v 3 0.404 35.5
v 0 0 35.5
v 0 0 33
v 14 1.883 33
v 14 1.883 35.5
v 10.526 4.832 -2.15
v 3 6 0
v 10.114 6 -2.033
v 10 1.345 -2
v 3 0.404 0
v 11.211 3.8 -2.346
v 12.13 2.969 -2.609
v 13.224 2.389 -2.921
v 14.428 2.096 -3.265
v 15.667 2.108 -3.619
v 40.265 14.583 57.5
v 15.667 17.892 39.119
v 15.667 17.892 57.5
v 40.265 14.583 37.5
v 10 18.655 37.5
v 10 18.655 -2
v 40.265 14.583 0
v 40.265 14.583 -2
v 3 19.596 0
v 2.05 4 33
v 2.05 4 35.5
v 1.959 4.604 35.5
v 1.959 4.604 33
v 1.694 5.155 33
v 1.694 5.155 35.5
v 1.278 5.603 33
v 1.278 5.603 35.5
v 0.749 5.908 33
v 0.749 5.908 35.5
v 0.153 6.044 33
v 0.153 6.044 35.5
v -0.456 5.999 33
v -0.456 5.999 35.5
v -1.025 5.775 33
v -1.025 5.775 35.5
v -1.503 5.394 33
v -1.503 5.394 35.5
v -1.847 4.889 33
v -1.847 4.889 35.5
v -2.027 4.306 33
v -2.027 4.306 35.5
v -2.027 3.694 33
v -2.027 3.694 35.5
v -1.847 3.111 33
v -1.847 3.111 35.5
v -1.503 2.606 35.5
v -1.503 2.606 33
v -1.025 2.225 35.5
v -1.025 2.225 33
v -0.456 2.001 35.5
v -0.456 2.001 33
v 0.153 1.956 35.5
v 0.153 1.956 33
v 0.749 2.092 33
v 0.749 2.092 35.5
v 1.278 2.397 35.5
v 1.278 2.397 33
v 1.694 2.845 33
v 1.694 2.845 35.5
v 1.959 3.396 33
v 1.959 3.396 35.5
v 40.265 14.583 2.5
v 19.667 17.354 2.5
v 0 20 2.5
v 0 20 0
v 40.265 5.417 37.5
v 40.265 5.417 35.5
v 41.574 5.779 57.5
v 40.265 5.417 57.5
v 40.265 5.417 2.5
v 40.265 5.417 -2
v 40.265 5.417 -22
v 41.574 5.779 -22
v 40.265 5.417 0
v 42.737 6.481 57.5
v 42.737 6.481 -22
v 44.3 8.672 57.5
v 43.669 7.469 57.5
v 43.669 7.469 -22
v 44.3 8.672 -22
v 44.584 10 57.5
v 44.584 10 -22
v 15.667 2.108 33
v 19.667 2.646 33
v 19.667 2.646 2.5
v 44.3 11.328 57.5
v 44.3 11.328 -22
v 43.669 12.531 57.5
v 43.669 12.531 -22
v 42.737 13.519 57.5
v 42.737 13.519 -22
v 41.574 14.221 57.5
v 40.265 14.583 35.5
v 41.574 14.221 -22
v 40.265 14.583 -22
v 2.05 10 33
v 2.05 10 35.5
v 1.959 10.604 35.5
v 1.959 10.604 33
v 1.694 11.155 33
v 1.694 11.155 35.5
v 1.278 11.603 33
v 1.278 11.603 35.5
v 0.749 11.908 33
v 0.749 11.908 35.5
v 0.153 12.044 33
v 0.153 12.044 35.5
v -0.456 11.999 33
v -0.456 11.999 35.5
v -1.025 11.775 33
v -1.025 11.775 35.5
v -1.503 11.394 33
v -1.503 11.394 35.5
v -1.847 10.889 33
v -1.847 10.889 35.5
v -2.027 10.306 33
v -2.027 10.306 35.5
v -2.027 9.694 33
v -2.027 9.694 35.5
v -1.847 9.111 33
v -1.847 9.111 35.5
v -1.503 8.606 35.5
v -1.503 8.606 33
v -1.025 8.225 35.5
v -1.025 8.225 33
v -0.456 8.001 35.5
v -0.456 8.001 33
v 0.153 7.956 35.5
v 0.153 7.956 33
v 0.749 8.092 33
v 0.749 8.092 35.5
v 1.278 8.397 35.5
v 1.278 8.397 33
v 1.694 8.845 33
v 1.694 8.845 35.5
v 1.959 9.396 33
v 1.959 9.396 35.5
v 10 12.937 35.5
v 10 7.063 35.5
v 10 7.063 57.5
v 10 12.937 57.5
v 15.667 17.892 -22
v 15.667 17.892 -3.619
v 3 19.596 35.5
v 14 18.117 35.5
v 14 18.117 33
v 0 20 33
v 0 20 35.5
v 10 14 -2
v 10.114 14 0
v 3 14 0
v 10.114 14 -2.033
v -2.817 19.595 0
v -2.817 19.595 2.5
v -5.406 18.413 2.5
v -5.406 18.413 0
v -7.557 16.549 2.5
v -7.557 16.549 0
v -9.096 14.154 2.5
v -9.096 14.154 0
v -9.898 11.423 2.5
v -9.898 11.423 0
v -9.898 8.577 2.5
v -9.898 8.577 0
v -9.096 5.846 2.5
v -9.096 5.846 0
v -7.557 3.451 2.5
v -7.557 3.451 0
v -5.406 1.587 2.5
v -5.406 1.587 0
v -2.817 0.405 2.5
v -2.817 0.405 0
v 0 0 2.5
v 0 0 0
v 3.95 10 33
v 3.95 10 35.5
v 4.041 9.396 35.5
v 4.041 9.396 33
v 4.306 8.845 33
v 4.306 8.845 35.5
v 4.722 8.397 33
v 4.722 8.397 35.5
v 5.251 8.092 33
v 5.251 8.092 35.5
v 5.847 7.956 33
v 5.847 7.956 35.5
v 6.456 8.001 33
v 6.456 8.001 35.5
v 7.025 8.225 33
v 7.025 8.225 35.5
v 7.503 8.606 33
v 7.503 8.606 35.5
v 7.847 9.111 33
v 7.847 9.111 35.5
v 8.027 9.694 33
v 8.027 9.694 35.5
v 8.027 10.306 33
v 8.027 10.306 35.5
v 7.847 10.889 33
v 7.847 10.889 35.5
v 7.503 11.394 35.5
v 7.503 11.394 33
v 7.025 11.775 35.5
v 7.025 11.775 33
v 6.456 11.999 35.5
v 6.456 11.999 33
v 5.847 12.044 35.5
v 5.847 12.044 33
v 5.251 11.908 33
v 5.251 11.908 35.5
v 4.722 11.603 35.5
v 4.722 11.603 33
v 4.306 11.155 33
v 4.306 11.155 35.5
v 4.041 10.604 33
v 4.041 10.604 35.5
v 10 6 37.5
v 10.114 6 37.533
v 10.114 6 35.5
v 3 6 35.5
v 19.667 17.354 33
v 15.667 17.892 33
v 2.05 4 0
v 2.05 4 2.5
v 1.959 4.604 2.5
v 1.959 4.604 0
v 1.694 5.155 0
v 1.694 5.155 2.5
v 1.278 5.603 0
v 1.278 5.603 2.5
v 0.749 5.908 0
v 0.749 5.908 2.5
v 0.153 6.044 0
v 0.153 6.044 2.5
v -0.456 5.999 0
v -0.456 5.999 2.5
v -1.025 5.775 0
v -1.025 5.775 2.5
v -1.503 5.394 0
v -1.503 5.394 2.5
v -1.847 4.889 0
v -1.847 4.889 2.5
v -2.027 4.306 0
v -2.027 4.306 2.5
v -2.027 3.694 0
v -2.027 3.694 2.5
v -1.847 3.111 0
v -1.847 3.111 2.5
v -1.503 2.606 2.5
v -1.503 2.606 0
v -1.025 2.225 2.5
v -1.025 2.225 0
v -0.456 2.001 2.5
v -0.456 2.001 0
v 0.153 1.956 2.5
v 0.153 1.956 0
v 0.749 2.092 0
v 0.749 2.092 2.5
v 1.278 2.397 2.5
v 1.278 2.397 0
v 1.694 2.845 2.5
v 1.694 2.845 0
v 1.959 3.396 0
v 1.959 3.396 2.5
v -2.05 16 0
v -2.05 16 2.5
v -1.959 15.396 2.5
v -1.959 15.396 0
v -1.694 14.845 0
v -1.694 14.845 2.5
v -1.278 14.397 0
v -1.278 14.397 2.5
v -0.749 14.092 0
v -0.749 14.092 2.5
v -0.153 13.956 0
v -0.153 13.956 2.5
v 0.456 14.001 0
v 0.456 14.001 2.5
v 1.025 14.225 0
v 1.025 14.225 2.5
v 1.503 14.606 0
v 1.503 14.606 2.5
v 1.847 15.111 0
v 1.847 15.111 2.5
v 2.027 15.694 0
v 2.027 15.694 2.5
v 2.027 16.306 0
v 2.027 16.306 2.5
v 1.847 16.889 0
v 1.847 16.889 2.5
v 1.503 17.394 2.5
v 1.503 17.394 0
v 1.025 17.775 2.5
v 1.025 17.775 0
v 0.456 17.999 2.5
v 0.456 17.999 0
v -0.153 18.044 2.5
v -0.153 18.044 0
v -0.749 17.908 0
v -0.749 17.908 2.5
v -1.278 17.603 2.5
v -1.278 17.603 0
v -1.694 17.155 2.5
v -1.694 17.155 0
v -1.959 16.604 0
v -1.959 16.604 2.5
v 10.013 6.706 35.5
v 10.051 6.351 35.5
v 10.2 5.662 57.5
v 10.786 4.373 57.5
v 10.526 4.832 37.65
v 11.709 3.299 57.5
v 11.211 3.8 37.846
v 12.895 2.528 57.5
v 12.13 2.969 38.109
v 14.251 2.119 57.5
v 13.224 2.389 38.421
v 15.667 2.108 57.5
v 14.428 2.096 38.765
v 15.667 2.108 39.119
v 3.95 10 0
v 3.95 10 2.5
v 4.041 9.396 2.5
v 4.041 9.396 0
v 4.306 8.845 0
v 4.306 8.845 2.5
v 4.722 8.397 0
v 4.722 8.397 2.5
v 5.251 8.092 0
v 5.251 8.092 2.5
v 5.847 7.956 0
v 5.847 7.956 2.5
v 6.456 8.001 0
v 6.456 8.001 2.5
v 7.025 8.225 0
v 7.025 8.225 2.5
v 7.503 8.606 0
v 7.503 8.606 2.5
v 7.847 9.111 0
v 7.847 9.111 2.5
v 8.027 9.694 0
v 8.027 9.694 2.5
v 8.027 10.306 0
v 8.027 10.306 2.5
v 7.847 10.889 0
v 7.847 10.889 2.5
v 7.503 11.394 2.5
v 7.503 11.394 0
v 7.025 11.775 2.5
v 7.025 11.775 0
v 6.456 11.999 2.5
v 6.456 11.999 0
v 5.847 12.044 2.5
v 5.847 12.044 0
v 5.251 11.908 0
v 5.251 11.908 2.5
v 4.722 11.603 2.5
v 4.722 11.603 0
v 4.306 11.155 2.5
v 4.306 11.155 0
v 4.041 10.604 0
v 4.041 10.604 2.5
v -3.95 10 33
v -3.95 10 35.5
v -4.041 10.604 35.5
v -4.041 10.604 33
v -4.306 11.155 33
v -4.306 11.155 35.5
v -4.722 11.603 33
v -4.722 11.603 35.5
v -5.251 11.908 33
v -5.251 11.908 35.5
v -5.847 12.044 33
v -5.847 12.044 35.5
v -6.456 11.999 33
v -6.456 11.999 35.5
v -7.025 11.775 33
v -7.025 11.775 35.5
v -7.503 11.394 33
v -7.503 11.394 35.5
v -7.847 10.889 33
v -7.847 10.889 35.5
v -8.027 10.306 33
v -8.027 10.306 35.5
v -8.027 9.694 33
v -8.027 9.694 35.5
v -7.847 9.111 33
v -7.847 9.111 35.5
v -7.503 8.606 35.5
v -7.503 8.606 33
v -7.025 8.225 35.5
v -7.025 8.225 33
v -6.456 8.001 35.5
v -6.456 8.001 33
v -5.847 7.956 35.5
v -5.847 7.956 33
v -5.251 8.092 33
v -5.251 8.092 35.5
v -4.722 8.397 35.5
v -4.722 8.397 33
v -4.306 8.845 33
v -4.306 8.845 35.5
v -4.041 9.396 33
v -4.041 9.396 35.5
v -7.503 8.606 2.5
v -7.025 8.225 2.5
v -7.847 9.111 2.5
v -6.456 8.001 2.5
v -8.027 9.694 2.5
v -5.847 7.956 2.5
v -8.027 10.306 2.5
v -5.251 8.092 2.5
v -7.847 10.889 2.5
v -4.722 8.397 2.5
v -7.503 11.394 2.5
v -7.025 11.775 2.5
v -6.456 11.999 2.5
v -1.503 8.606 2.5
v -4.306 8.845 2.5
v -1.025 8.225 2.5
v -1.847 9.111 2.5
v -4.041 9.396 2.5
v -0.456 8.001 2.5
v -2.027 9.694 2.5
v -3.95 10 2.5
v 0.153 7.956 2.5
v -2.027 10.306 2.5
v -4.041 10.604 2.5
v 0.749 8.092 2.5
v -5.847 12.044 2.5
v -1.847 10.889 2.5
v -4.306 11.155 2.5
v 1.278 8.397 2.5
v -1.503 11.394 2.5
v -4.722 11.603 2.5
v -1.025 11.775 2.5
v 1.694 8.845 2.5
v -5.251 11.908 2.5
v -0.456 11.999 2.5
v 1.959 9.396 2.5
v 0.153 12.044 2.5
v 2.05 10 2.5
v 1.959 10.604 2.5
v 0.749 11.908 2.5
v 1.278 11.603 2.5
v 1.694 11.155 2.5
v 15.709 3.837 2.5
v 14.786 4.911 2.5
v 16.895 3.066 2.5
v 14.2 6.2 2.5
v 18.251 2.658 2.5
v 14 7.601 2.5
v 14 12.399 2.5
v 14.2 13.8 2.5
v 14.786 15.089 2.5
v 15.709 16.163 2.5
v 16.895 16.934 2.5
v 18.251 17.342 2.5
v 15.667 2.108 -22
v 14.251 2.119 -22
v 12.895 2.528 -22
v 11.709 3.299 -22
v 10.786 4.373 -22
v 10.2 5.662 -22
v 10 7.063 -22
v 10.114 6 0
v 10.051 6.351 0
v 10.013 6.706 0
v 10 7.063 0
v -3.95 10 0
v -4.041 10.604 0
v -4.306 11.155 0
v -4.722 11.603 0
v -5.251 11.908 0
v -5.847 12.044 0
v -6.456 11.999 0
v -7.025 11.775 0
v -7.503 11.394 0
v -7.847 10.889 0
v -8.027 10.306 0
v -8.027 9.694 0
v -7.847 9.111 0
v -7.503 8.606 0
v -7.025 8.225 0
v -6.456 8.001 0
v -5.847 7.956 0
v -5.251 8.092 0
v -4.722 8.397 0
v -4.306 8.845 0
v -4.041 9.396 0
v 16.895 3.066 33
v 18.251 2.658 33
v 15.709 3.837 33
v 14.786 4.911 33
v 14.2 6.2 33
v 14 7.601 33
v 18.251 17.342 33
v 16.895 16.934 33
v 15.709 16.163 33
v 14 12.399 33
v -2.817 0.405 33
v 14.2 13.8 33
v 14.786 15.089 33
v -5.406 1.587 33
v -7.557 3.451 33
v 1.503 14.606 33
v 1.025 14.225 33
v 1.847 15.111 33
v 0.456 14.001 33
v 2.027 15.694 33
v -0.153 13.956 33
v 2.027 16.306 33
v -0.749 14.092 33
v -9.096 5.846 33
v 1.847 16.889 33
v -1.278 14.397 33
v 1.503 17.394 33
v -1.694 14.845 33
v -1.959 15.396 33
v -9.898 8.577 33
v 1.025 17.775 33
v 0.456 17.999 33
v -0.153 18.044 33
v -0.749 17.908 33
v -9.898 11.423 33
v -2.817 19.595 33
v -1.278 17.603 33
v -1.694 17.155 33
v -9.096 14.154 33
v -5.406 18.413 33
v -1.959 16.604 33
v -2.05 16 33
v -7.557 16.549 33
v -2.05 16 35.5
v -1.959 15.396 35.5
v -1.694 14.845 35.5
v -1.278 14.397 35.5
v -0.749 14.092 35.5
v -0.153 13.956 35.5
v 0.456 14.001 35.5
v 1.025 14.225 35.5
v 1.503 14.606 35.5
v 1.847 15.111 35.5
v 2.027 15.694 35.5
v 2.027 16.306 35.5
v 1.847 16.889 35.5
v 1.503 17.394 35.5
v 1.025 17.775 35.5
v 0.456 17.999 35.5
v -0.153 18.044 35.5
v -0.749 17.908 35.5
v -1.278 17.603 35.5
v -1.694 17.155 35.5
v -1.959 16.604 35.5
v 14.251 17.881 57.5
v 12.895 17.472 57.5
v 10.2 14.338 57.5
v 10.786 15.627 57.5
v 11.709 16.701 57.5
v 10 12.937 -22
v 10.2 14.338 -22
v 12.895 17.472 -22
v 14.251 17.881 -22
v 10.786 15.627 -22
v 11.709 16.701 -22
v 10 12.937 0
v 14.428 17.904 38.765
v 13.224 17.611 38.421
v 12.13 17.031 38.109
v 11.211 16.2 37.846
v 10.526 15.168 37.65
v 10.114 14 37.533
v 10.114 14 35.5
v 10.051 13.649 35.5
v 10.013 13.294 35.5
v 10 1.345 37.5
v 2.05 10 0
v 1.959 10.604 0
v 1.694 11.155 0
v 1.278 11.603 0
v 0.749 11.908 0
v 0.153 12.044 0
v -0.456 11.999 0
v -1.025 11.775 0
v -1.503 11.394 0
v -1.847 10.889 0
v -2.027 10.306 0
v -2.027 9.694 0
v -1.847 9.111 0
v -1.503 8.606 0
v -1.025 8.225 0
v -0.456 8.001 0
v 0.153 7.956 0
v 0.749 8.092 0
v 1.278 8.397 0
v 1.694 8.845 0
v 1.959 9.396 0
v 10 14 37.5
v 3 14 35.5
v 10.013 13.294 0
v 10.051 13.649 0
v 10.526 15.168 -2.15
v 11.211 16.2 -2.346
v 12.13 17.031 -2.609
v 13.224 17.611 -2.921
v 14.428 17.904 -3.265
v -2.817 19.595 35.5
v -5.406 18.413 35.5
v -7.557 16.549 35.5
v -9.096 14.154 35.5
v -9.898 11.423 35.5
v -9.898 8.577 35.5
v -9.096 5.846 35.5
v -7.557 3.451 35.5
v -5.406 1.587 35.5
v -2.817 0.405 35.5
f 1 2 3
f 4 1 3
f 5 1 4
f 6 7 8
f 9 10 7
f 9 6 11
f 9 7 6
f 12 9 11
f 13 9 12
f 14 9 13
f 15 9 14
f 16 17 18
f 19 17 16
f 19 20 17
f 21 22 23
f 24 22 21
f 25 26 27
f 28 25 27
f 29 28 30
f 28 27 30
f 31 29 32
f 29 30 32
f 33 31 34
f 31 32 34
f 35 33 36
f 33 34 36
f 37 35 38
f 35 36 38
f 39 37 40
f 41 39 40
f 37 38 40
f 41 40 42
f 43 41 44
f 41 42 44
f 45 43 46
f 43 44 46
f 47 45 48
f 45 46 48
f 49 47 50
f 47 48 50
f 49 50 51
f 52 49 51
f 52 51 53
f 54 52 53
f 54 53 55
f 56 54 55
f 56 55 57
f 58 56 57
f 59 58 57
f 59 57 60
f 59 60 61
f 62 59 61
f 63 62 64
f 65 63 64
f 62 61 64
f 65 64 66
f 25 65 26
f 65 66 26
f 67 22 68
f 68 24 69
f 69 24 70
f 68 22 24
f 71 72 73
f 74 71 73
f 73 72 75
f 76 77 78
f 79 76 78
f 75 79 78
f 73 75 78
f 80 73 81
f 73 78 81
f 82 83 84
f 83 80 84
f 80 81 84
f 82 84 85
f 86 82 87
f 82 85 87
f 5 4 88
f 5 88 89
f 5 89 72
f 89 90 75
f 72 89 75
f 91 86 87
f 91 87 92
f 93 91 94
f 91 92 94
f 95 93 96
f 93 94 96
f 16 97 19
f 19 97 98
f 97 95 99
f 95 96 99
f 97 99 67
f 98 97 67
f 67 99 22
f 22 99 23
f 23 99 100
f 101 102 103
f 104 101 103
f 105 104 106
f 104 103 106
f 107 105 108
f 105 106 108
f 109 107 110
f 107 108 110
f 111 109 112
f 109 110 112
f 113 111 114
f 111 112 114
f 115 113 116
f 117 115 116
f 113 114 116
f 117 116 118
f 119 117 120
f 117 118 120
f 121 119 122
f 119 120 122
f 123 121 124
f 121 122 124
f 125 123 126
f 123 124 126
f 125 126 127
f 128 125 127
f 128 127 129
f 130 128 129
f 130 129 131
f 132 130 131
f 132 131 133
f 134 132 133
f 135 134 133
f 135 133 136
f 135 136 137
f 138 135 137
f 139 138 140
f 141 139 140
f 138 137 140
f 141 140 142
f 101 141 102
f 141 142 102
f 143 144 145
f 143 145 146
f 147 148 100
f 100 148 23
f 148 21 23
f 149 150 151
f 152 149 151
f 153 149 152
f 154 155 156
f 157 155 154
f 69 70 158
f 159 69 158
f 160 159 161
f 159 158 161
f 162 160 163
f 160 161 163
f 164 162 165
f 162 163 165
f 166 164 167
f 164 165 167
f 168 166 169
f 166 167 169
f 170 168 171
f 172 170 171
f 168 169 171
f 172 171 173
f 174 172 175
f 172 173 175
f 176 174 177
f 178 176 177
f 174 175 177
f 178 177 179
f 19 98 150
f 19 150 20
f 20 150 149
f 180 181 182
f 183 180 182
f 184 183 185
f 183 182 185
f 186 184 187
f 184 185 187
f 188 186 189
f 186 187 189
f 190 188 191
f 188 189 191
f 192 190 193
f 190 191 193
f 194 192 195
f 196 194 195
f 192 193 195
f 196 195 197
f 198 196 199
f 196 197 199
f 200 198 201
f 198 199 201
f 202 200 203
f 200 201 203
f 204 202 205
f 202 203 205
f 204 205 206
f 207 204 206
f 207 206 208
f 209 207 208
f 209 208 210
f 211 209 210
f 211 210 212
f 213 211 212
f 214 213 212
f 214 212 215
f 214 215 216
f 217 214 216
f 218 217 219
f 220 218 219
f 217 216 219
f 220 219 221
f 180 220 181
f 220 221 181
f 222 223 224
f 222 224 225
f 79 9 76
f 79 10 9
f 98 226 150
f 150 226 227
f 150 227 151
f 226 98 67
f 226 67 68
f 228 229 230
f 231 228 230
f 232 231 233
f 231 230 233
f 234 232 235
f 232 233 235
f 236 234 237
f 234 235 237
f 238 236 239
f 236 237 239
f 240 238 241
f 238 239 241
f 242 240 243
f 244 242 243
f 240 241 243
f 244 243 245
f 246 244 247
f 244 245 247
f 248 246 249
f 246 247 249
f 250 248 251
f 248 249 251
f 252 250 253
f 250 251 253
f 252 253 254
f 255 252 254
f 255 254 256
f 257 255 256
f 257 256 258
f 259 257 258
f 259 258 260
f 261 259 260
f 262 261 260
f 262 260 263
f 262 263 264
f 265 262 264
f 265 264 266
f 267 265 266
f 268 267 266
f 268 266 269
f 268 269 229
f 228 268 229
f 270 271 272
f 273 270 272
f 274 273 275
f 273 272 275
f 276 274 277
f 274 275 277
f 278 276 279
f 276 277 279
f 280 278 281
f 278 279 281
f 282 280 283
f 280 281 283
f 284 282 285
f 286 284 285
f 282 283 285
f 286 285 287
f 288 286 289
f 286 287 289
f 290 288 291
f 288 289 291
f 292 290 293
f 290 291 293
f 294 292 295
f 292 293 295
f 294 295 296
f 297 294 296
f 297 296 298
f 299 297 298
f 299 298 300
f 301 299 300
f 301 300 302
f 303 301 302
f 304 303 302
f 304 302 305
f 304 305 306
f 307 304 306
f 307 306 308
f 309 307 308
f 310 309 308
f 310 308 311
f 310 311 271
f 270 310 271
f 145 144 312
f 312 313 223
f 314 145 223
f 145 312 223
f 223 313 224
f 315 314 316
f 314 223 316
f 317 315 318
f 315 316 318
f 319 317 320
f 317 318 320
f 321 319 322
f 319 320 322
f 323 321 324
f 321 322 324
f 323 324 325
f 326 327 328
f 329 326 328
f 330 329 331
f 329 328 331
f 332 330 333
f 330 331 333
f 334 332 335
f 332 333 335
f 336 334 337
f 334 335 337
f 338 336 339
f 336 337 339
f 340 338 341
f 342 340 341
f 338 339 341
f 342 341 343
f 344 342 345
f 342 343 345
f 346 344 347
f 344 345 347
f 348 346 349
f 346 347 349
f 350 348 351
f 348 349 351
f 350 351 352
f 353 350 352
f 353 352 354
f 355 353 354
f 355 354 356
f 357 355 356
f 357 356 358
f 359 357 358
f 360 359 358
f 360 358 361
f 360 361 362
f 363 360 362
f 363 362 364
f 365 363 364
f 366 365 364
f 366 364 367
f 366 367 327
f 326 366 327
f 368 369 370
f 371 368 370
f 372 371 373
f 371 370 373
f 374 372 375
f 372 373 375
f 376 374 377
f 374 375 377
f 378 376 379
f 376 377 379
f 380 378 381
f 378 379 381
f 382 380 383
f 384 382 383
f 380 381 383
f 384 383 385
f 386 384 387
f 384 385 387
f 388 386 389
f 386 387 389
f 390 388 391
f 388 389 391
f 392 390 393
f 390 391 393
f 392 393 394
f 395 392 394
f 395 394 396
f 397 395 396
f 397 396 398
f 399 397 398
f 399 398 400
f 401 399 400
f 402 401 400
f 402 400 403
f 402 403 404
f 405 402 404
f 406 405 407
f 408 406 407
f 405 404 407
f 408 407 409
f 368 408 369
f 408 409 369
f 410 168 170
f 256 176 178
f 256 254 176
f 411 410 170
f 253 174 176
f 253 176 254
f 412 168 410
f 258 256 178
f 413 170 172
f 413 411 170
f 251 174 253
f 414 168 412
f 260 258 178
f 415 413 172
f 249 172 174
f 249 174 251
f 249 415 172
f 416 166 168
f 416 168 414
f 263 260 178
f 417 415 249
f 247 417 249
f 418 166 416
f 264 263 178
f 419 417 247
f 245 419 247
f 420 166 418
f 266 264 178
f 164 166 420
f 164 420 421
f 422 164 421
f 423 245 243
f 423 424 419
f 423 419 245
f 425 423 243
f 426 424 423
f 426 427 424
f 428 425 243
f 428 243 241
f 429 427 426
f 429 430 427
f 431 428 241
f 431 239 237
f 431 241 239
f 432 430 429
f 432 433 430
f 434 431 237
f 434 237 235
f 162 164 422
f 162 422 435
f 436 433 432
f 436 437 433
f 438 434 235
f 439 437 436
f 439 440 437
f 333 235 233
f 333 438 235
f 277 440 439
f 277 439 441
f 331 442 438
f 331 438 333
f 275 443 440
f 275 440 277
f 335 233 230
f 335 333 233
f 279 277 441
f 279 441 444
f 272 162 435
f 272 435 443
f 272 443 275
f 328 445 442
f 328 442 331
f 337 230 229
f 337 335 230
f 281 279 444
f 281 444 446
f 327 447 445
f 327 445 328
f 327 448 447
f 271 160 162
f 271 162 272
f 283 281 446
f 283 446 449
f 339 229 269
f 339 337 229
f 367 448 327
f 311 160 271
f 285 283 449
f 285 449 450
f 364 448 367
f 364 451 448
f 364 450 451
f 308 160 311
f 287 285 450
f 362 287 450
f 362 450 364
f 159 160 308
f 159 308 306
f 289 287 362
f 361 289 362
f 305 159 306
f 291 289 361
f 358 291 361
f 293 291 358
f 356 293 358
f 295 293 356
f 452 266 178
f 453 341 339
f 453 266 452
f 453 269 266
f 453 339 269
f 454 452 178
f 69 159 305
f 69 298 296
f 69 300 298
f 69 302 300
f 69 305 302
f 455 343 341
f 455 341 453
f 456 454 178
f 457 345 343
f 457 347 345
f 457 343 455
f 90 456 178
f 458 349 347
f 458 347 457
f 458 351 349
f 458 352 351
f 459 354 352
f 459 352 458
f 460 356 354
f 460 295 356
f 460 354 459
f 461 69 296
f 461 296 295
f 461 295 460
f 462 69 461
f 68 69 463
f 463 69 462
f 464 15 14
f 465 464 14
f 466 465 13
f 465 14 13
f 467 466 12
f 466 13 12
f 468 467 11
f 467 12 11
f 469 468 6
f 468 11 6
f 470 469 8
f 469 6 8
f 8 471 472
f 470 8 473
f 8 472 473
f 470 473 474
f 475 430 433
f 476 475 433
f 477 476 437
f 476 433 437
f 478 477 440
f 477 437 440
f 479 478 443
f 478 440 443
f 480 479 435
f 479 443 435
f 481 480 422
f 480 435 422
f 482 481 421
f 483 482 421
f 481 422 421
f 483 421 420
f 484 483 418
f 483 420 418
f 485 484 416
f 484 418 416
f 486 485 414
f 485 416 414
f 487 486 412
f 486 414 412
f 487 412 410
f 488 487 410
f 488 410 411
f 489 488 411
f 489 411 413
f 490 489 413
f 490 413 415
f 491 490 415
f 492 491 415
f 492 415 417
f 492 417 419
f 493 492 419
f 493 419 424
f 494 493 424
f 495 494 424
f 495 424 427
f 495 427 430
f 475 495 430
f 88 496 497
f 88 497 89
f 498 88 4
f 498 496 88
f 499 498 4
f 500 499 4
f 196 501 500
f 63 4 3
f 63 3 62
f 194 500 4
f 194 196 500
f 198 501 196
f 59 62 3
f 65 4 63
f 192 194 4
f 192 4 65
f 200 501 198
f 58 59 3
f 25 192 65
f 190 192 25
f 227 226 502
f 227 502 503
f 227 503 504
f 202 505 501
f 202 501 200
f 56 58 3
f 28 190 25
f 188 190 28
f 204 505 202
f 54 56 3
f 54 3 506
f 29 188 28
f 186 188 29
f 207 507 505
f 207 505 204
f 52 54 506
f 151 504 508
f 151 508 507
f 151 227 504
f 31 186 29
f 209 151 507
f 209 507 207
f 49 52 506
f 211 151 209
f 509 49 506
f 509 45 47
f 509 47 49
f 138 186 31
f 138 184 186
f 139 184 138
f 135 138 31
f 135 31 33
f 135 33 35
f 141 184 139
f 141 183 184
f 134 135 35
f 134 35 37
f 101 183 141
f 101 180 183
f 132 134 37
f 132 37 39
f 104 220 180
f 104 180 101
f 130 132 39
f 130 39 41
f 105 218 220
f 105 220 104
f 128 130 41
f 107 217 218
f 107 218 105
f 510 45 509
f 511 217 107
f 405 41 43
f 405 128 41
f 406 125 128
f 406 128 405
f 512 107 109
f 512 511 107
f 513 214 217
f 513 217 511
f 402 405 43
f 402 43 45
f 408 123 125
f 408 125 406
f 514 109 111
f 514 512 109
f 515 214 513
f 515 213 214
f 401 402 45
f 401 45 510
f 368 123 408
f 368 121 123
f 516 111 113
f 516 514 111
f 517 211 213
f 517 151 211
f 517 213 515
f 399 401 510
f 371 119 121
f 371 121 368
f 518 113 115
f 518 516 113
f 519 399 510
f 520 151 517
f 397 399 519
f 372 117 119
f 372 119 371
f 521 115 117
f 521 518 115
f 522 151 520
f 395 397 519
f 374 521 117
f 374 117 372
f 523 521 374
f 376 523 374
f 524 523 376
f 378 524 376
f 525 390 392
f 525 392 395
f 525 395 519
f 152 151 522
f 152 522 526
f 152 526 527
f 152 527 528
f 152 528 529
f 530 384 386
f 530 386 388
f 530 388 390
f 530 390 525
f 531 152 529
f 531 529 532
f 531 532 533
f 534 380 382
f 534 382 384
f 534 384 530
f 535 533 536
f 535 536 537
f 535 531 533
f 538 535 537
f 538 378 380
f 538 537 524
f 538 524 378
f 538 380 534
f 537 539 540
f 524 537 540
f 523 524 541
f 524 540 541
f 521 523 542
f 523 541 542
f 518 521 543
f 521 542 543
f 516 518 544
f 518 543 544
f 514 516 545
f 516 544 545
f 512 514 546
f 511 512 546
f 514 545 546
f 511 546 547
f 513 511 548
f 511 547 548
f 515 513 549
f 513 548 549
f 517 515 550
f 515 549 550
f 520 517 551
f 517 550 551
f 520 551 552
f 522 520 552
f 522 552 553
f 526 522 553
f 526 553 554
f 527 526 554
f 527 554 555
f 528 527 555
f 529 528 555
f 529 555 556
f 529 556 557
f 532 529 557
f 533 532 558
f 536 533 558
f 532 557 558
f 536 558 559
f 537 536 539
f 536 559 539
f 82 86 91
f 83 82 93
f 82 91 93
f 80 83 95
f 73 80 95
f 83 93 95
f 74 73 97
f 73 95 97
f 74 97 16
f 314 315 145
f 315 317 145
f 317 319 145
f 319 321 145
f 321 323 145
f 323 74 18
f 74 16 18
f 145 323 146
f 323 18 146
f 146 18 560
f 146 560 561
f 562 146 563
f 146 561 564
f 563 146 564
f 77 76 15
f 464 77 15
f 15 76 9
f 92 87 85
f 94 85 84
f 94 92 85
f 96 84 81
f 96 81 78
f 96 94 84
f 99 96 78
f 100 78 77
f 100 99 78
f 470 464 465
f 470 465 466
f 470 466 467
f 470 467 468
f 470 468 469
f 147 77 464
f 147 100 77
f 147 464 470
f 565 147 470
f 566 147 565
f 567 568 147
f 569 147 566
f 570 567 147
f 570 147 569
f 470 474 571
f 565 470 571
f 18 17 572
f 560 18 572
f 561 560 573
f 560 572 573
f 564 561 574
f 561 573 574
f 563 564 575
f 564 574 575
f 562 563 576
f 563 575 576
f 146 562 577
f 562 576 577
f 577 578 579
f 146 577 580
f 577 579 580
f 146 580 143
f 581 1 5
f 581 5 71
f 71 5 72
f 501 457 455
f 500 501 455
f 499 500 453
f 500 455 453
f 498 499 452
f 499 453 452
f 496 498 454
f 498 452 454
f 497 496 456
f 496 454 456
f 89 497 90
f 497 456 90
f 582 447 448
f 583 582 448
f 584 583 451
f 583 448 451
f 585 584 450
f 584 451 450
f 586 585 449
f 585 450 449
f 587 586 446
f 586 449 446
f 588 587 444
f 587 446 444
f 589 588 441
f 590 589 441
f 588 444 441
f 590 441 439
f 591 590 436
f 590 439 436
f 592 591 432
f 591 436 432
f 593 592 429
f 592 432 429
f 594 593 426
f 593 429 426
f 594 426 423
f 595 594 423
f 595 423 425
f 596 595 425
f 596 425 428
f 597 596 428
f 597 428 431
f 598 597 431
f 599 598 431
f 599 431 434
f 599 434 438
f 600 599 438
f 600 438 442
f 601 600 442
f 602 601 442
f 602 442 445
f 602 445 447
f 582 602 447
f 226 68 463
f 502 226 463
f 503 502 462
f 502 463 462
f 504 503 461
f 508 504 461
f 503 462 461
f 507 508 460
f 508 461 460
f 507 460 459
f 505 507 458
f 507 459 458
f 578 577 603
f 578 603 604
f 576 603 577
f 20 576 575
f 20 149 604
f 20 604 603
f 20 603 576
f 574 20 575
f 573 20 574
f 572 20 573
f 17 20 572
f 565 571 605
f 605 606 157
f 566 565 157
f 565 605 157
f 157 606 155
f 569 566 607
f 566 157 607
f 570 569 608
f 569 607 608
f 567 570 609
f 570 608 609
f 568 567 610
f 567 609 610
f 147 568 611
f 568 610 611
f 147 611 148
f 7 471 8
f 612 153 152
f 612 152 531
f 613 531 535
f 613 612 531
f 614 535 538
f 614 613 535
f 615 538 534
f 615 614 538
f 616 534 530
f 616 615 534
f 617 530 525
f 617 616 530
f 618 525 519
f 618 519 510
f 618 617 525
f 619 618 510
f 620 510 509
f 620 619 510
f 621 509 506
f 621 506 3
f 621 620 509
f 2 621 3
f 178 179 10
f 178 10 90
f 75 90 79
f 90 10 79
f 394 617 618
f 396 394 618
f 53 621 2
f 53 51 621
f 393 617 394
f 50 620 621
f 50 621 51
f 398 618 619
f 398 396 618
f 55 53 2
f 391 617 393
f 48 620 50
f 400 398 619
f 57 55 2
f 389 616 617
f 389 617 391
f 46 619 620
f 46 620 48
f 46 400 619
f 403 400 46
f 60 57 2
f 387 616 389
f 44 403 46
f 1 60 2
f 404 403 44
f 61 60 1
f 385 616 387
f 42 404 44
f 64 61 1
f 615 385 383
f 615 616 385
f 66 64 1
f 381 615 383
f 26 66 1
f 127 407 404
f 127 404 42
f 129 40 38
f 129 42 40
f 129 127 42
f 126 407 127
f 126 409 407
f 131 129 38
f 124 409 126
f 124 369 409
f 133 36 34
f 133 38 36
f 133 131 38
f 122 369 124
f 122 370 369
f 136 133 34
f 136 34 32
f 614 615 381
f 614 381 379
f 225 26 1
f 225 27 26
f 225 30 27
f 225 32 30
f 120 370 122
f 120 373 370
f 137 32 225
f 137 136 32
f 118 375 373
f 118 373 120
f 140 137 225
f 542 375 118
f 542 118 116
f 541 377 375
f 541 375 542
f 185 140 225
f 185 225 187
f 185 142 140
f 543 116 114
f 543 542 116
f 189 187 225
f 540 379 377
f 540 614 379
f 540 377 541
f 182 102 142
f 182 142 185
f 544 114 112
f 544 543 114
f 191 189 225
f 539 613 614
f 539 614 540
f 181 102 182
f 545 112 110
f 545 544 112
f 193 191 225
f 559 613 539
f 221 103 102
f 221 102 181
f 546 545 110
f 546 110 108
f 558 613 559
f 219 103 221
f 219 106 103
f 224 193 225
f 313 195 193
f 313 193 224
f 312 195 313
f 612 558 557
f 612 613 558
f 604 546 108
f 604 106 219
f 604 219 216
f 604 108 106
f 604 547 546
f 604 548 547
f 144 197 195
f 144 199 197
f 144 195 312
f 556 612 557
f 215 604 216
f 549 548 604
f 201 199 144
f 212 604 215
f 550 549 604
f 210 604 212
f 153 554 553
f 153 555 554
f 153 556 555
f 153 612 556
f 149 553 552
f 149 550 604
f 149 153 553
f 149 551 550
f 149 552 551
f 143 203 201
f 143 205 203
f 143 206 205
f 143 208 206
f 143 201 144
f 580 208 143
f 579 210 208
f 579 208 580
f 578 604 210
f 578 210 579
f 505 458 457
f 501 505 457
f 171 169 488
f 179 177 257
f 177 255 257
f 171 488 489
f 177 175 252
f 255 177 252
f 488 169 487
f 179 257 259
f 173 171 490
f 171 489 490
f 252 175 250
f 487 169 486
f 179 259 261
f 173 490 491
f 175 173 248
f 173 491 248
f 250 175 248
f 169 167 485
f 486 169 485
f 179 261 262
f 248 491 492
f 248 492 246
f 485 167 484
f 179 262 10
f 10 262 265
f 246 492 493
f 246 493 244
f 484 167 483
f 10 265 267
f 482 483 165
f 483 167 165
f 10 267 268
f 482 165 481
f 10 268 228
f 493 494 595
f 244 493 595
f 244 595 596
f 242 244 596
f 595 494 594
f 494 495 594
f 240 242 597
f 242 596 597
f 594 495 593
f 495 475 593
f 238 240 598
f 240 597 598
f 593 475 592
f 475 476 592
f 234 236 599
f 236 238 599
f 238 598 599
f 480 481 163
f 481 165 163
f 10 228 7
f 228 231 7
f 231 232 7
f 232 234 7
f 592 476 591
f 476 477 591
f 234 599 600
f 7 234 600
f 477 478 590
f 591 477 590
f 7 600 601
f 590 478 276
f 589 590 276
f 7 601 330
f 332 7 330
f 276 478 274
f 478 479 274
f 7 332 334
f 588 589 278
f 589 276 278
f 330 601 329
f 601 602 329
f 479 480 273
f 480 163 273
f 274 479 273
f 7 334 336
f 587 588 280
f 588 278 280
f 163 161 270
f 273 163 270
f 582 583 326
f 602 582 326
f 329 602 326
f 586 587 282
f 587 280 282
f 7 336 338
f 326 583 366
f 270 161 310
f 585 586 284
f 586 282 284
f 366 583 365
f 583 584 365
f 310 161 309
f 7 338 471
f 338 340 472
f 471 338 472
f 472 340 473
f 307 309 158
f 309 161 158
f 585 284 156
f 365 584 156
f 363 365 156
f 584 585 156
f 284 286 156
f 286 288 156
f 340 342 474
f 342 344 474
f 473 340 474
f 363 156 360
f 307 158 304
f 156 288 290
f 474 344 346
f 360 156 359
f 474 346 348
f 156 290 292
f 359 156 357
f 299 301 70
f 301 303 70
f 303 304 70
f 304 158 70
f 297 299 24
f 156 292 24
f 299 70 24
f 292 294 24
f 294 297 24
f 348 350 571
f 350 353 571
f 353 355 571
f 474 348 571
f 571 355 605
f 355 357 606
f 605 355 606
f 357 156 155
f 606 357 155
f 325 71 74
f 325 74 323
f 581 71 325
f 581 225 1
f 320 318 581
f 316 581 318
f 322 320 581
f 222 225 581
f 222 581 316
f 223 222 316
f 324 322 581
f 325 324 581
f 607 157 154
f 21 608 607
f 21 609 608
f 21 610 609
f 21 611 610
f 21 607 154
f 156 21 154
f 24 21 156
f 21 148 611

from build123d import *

# Parameters (mm, degrees)
BOSS_EXTRU_1_DEPTH           = 2.5
ESQUISSE2_R                  = 2.05
ENL_V_MAT_EXTRU_1_DEPTH      = 49.94129136
BOSS_EXTRU_2_DEPTH           = 33
ESQUISSE6_R                  = 2.05
BOSS_EXTRU_3_DEPTH           = 2.5
BOSS_EXTRU_4_DEPTH           = 2
BOSS_EXTRU_5_START           = -35.5
BOSS_EXTRU_5_DEPTH           = 2
ENL_V_MAT_EXTRU_5_DEPTH      = 62.605600395
ENL_V_MAT_EXTRU_5_DEPTH_BACK = 62.605600395
BOSS_EXTRU_6_DEPTH           = 20
BOSS_EXTRU_7_START           = -39.5
BOSS_EXTRU_7_DEPTH           = 20
CONG_1_R                     = 5


with BuildPart() as part:
    # Esquisse1 → Boss.-Extru.1 (new body)
    with BuildSketch(Plane.XY):
        with BuildLine():
            Line((0, 0), (44.598206242, 6))
            Line((44.598206242, 6), (44.598206242, 14))
            Line((44.598206242, 14), (0, 20))
            ThreePointArc((0, 20), (-10, 10), (0, 0))
        make_face()
    extrude(amount=BOSS_EXTRU_1_DEPTH)

    # Esquisse2 → Enlèv. mat.-Extru.1 (cut, through all)
    with BuildSketch(Plane.XY.offset(2.5)):
        with Locations((-6, 10)):
            Circle(ESQUISSE2_R)
        with Locations((0, 4)):
            Circle(ESQUISSE2_R)
        with Locations(Location((0, 16, 0), (0, 0, 180))):
            Circle(ESQUISSE2_R)
        with Locations(Location((6, 10, 0), (0, 0, 180))):
            Circle(ESQUISSE2_R)
        with Locations((0, 10)):
            Circle(ESQUISSE2_R)
    extrude(amount=-ENL_V_MAT_EXTRU_1_DEPTH, mode=Mode.SUBTRACT)

    # Esquisse5 → Boss.-Extru.2 (add)
    with BuildSketch(Plane.XY.offset(2.5)):
        Polygon((44.598206242, 14), (14, 18.116516177), (14, 1.883483823), (44.598206242, 6), align=None)
    extrude(amount=BOSS_EXTRU_2_DEPTH)

    # Esquisse6 → Boss.-Extru.3 (add)
    with BuildSketch(Plane.XY.offset(35.5)):
        with BuildLine():
            Line((44.598206242, 14), (0, 20))
            ThreePointArc((0, 20), (-10, 10), (0, 0))
            Line((0, 0), (44.598206242, 6))
            Line((44.598206242, 6), (44.598206242, 14))
        make_face()
        with Locations(Location((0, 16, 0), (0, 0, 180))):
            Circle(ESQUISSE6_R, mode=Mode.SUBTRACT)
        with Locations((-6, 10)):
            Circle(ESQUISSE6_R, mode=Mode.SUBTRACT)
        with Locations(Location((6, 10, 0), (0, 0, 180))):
            Circle(ESQUISSE6_R, mode=Mode.SUBTRACT)
        with Locations((0, 4)):
            Circle(ESQUISSE6_R, mode=Mode.SUBTRACT)
        with Locations((0, 10)):
            Circle(ESQUISSE6_R, mode=Mode.SUBTRACT)
    extrude(amount=-BOSS_EXTRU_3_DEPTH)

    # Esquisse9 → Boss.-Extru.4 (add)
    with BuildSketch(Plane.XY.offset(35.5)):
        Polygon((44.598206242, 14), (3, 19.596396324), (3, 14), (10, 14), (10, 6), (3, 6), (3, 0.403603676), (44.598206242, 6), align=None)
    extrude(amount=BOSS_EXTRU_4_DEPTH)

    # Esquisse9<2> → Boss.-Extru.5 (add)
    with BuildSketch(Plane.XY.offset(35.5).offset(BOSS_EXTRU_5_START)):
        Polygon((44.598206242, 14), (3, 19.596396324), (3, 14), (10, 14), (10, 6), (3, 6), (3, 0.403603676), (44.598206242, 6), align=None)
    extrude(amount=-BOSS_EXTRU_5_DEPTH)

    # Esquisse11 → Enlèv. mat.-Extru.5 (cut, two sides: drawn at the far end of the back side and taken through both)
    with BuildSketch(Plane(origin=(0, 0, 0), x_dir=(1, 0, 0), z_dir=(0, 1, 0)).offset(-ENL_V_MAT_EXTRU_5_DEPTH_BACK)):
        Polygon((3, -35.5), (10, -37.5), (3, -37.5), align=None)
        Polygon((3, 2), (3, 0), (10, 2), align=None)
    extrude(amount=ENL_V_MAT_EXTRU_5_DEPTH + ENL_V_MAT_EXTRU_5_DEPTH_BACK, mode=Mode.SUBTRACT)

    # Esquisse12 → Boss.-Extru.6 (add)
    with BuildSketch(Plane(origin=(0, 0, -2), x_dir=(-1, 0, 0), z_dir=(0, 0, -1))):
        Polygon((-44.598206242, 14), (-44.598206242, 6), (-10, 1.345345588), (-10, 18.654654412), align=None)
    extrude(amount=BOSS_EXTRU_6_DEPTH)

    # Esquisse12<2> → Boss.-Extru.7 (add)
    with BuildSketch(Plane(origin=(0, 0, -2), x_dir=(-1, 0, 0), z_dir=(0, 0, -1)).offset(BOSS_EXTRU_7_START)):
        Polygon((-44.598206242, 14), (-44.598206242, 6), (-10, 1.345345588), (-10, 18.654654412), align=None)
    extrude(amount=-BOSS_EXTRU_7_DEPTH)

    # Congé1
    # the kernel refuses this fillet: 5 mm, written as the material it takes off along each edge
    with BuildSketch(Plane(origin=(10, 18.654654412, 23.205703128), x_dir=(0.9910712498212338, -0.1333333333333327, 0), z_dir=(0, 0, 1))) as cong_1_piece_1_section:
        with BuildLine():
            CenterArc((CONG_1_R * 1.14354374979, -CONG_1_R), CONG_1_R, 90, 97.662255661)
            Line((CONG_1_R * 0.152472499972, -CONG_1_R * 1.13333333333), (0, 0))
            Line((0, 0), (CONG_1_R * 1.14354374979, 0))
        make_face()
    cong_1_piece_1 = extrude(amount=48.588593745, mode=Mode.PRIVATE)
    cong_1_piece_1 = split(cong_1_piece_1, bisect_by=Plane(origin=(14.41713272, 17.97630815, 33), z_dir=(0, 0, -1)), keep=Keep.TOP, mode=Mode.PRIVATE)
    add(cong_1_piece_1, mode=Mode.SUBTRACT)
    with BuildSketch(Plane(origin=(10, 18.654654412, 23.205703128), x_dir=(0.9910712498212338, -0.1333333333333327, 0), z_dir=(0, 0, 1))) as cong_1_piece_2_section:
        with BuildLine():
            CenterArc((CONG_1_R * 1.14354374979, -CONG_1_R), CONG_1_R, 90, 97.662255661)
            Line((CONG_1_R * 0.152472499972, -CONG_1_R * 1.13333333333), (0, 0))
            Line((0, 0), (CONG_1_R * 1.14354374979, 0))
        make_face()
    cong_1_piece_2 = extrude(amount=48.588593745, mode=Mode.PRIVATE)
    cong_1_piece_2 = split(cong_1_piece_2, bisect_by=Plane(origin=(16.890425436, 17.976343962, 39.468692982), z_dir=(-0.27472112789737807, 0, 0.9615239476408232)), keep=Keep.TOP, mode=Mode.PRIVATE)
    add(cong_1_piece_2, mode=Mode.SUBTRACT)
    with BuildSketch(Plane(origin=(10, 18.654654412, 23.205703128), x_dir=(0.9910712498212338, -0.1333333333333327, 0), z_dir=(0, 0, 1))) as cong_1_piece_3_section:
        with BuildLine():
            CenterArc((CONG_1_R * 1.14354374979, -CONG_1_R), CONG_1_R, 90, 97.662255661)
            Line((CONG_1_R * 0.152472499972, -CONG_1_R * 1.13333333333), (0, 0))
            Line((0, 0), (CONG_1_R * 1.14354374979, 0))
        make_face()
    cong_1_piece_3 = extrude(amount=48.588593745, mode=Mode.PRIVATE)
    cong_1_piece_3 = split(cong_1_piece_3, bisect_by=Plane(origin=(10.034324998, 14, 36.504903571), z_dir=(0, -1, 0)), keep=Keep.TOP, mode=Mode.PRIVATE)
    cong_1_piece_3 = split(cong_1_piece_3, bisect_by=Plane(origin=(10.034324998, 13.735276956, 35.5), z_dir=(0, 0, 1)), keep=Keep.TOP, mode=Mode.PRIVATE)
    add(cong_1_piece_3, mode=Mode.SUBTRACT)
    with BuildSketch(Plane(origin=(10, 1.345345588, 23.205703128), x_dir=(0.9910712498212336, 0.13333333333333347, 0), z_dir=(0, 0, 1))) as cong_1_piece_4_section:
        with BuildLine():
            CenterArc((CONG_1_R * 1.14354374979, CONG_1_R), CONG_1_R, 172.337744339, 97.662255661)
            Line((CONG_1_R * 0.152472499972, CONG_1_R * 1.13333333333), (0, 0))
            Line((0, 0), (CONG_1_R * 1.14354374979, 0))
        make_face()
    cong_1_piece_4 = extrude(amount=48.588593745, mode=Mode.PRIVATE)
    cong_1_piece_4 = split(cong_1_piece_4, bisect_by=Plane(origin=(14.41713272, 2.02369185, 33), z_dir=(0, 0, -1)), keep=Keep.TOP, mode=Mode.PRIVATE)
    add(cong_1_piece_4, mode=Mode.SUBTRACT)
    with BuildSketch(Plane(origin=(10, 1.345345588, 23.205703128), x_dir=(0.9910712498212336, 0.13333333333333347, 0), z_dir=(0, 0, 1))) as cong_1_piece_5_section:
        with BuildLine():
            CenterArc((CONG_1_R * 1.14354374979, CONG_1_R), CONG_1_R, 172.337744339, 97.662255661)
            Line((CONG_1_R * 0.152472499972, CONG_1_R * 1.13333333333), (0, 0))
            Line((0, 0), (CONG_1_R * 1.14354374979, 0))
        make_face()
    cong_1_piece_5 = extrude(amount=48.588593745, mode=Mode.PRIVATE)
    cong_1_piece_5 = split(cong_1_piece_5, bisect_by=Plane(origin=(16.890425436, 2.023656038, 39.468692982), z_dir=(-0.27472112789737807, 0, 0.9615239476408232)), keep=Keep.TOP, mode=Mode.PRIVATE)
    add(cong_1_piece_5, mode=Mode.SUBTRACT)
    with BuildSketch(Plane(origin=(10, 1.345345588, 23.205703128), x_dir=(0.9910712498212336, 0.13333333333333347, 0), z_dir=(0, 0, 1))) as cong_1_piece_6_section:
        with BuildLine():
            CenterArc((CONG_1_R * 1.14354374979, CONG_1_R), CONG_1_R, 172.337744339, 97.662255661)
            Line((CONG_1_R * 0.152472499972, CONG_1_R * 1.13333333333), (0, 0))
            Line((0, 0), (CONG_1_R * 1.14354374979, 0))
        make_face()
    cong_1_piece_6 = extrude(amount=48.588593745, mode=Mode.PRIVATE)
    cong_1_piece_6 = split(cong_1_piece_6, bisect_by=Plane(origin=(10.034324998, 6, 36.504903571), z_dir=(0, 1, 0)), keep=Keep.TOP, mode=Mode.PRIVATE)
    cong_1_piece_6 = split(cong_1_piece_6, bisect_by=Plane(origin=(10.034324998, 6.264723044, 35.5), z_dir=(0, 0, 1)), keep=Keep.TOP, mode=Mode.PRIVATE)
    add(cong_1_piece_6, mode=Mode.SUBTRACT)
    with BuildSketch(Plane(origin=(10, 18.654654412, 12.294296872), x_dir=(0, -1, 0), z_dir=(0, 0, -1))) as cong_1_piece_7_section:
        with BuildLine():
            CenterArc((CONG_1_R * 1.14354374979, -CONG_1_R), CONG_1_R, 90, 97.662255661)
            Line((CONG_1_R * 0.152472499972, -CONG_1_R * 1.13333333333), (0, 0))
            Line((0, 0), (CONG_1_R * 1.14354374979, 0))
        make_face()
    cong_1_piece_7 = extrude(amount=48.588593745, mode=Mode.PRIVATE)
    cong_1_piece_7 = split(cong_1_piece_7, bisect_by=Plane(origin=(14.41713272, 17.97630815, 2.5), z_dir=(0, 0, 1)), keep=Keep.TOP, mode=Mode.PRIVATE)
    add(cong_1_piece_7, mode=Mode.SUBTRACT)
    with BuildSketch(Plane(origin=(10, 18.654654412, 12.294296872), x_dir=(0, -1, 0), z_dir=(0, 0, -1))) as cong_1_piece_8_section:
        with BuildLine():
            CenterArc((CONG_1_R * 1.14354374979, -CONG_1_R), CONG_1_R, 90, 97.662255661)
            Line((CONG_1_R * 0.152472499972, -CONG_1_R * 1.13333333333), (0, 0))
            Line((0, 0), (CONG_1_R * 1.14354374979, 0))
        make_face()
    cong_1_piece_8 = extrude(amount=48.588593745, mode=Mode.PRIVATE)
    cong_1_piece_8 = split(cong_1_piece_8, bisect_by=Plane(origin=(10.034324998, 14, -1.004903571), z_dir=(0, -1, 0)), keep=Keep.TOP, mode=Mode.PRIVATE)
    cong_1_piece_8 = split(cong_1_piece_8, bisect_by=Plane(origin=(10.034324998, 13.735276956, 0), z_dir=(0, 0, -1)), keep=Keep.TOP, mode=Mode.PRIVATE)
    add(cong_1_piece_8, mode=Mode.SUBTRACT)
    with BuildSketch(Plane(origin=(10, 18.654654412, 12.294296872), x_dir=(0, -1, 0), z_dir=(0, 0, -1))) as cong_1_piece_9_section:
        with BuildLine():
            CenterArc((CONG_1_R * 1.14354374979, -CONG_1_R), CONG_1_R, 90, 97.662255661)
            Line((CONG_1_R * 0.152472499972, -CONG_1_R * 1.13333333333), (0, 0))
            Line((0, 0), (CONG_1_R * 1.14354374979, 0))
        make_face()
    cong_1_piece_9 = extrude(amount=48.588593745, mode=Mode.PRIVATE)
    cong_1_piece_9 = split(cong_1_piece_9, bisect_by=Plane(origin=(13.812288086, 17.172261855, -3.089225167), z_dir=(-0.27472112789737835, 0, -0.9615239476408232)), keep=Keep.TOP, mode=Mode.PRIVATE)
    add(cong_1_piece_9, mode=Mode.SUBTRACT)
    with BuildSketch(Plane(origin=(10, 1.345345588, 12.294296872), x_dir=(0.9910712498212336, 0.13333333333333347, 0), z_dir=(0, 0, -1))) as cong_1_piece_10_section:
        with BuildLine():
            CenterArc((CONG_1_R * 1.14354374979, -CONG_1_R), CONG_1_R, 90, 97.662255661)
            Line((CONG_1_R * 0.152472499972, -CONG_1_R * 1.13333333333), (0, 0))
            Line((0, 0), (CONG_1_R * 1.14354374979, 0))
        make_face()
    cong_1_piece_10 = extrude(amount=48.588593745, mode=Mode.PRIVATE)
    cong_1_piece_10 = split(cong_1_piece_10, bisect_by=Plane(origin=(14.41713272, 2.02369185, 2.5), z_dir=(0, 0, 1)), keep=Keep.TOP, mode=Mode.PRIVATE)
    add(cong_1_piece_10, mode=Mode.SUBTRACT)
    with BuildSketch(Plane(origin=(10, 1.345345588, 12.294296872), x_dir=(0.9910712498212336, 0.13333333333333347, 0), z_dir=(0, 0, -1))) as cong_1_piece_11_section:
        with BuildLine():
            CenterArc((CONG_1_R * 1.14354374979, -CONG_1_R), CONG_1_R, 90, 97.662255661)
            Line((CONG_1_R * 0.152472499972, -CONG_1_R * 1.13333333333), (0, 0))
            Line((0, 0), (CONG_1_R * 1.14354374979, 0))
        make_face()
    cong_1_piece_11 = extrude(amount=48.588593745, mode=Mode.PRIVATE)
    cong_1_piece_11 = split(cong_1_piece_11, bisect_by=Plane(origin=(16.890425436, 2.023656038, -3.968692982), z_dir=(-0.27472112789737835, 0, -0.9615239476408232)), keep=Keep.TOP, mode=Mode.PRIVATE)
    add(cong_1_piece_11, mode=Mode.SUBTRACT)
    with BuildSketch(Plane(origin=(10, 1.345345588, 12.294296872), x_dir=(0.9910712498212336, 0.13333333333333347, 0), z_dir=(0, 0, -1))) as cong_1_piece_12_section:
        with BuildLine():
            CenterArc((CONG_1_R * 1.14354374979, -CONG_1_R), CONG_1_R, 90, 97.662255661)
            Line((CONG_1_R * 0.152472499972, -CONG_1_R * 1.13333333333), (0, 0))
            Line((0, 0), (CONG_1_R * 1.14354374979, 0))
        make_face()
    cong_1_piece_12 = extrude(amount=48.588593745, mode=Mode.PRIVATE)
    cong_1_piece_12 = split(cong_1_piece_12, bisect_by=Plane(origin=(10.034324998, 6, -1.004903571), z_dir=(0, 1, 0)), keep=Keep.TOP, mode=Mode.PRIVATE)
    cong_1_piece_12 = split(cong_1_piece_12, bisect_by=Plane(origin=(10.034324998, 6.264723044, 0), z_dir=(0, 0, -1)), keep=Keep.TOP, mode=Mode.PRIVATE)
    add(cong_1_piece_12, mode=Mode.SUBTRACT)
    with BuildSketch(Plane(origin=(14, 18.116516177, 2.5), x_dir=(0.9910712498212336, -0.13333333333333325, 0), z_dir=(0, 0, 1))) as cong_1_piece_13:
        with BuildLine():
            CenterArc((CONG_1_R * 1.14354374979, -CONG_1_R), CONG_1_R, 90, 97.662255661)
            Line((CONG_1_R * 0.152472499972, -CONG_1_R * 1.13333333333), (0, 0))
            Line((0, 0), (CONG_1_R * 1.14354374979, 0))
        make_face()
    extrude(amount=30.5, mode=Mode.SUBTRACT)
    with BuildSketch(Plane(origin=(14, 1.883483823, 2.5), x_dir=(0.9910712498212336, 0.13333333333333353, 0), z_dir=(0, 0, 1))) as cong_1_piece_14:
        with BuildLine():
            CenterArc((CONG_1_R * 1.14354374979, CONG_1_R), CONG_1_R, 172.337744339, 97.662255661)
            Line((CONG_1_R * 0.152472499972, CONG_1_R * 1.13333333333), (0, 0))
            Line((0, 0), (CONG_1_R * 1.14354374979, 0))
        make_face()
    extrude(amount=30.5, mode=Mode.SUBTRACT)
    with BuildSketch(Plane(origin=(44.598206242, 14, -32.930932902), x_dir=(-0.9910712498212338, 0.13333333333333305, 0), z_dir=(0, 0, 1))) as cong_1_piece_15:
        with BuildLine():
            CenterArc((CONG_1_R * 0.874474632195, CONG_1_R), CONG_1_R, 187.662255661, 82.337744339)
            Line((-CONG_1_R * 0.116596617626, CONG_1_R * 0.866666666667), (0, 0))
            Line((0, 0), (CONG_1_R * 0.874474632195, 0))
        make_face()
    extrude(amount=101.361865805, mode=Mode.SUBTRACT)
    with BuildSketch(Plane(origin=(44.598206242, 6, -32.930932902), x_dir=(-0.9910712498212337, -0.1333333333333333, 0), z_dir=(0, 0, 1))) as cong_1_piece_16:
        with BuildLine():
            CenterArc((CONG_1_R * 0.874474632195, -CONG_1_R), CONG_1_R, 90, 82.337744339)
            Line((-CONG_1_R * 0.116596617626, -CONG_1_R * 0.866666666667), (0, 0))
            Line((0, 0), (CONG_1_R * 0.874474632195, 0))
        make_face()
    extrude(amount=101.361865805, mode=Mode.SUBTRACT)


solid = part.part
